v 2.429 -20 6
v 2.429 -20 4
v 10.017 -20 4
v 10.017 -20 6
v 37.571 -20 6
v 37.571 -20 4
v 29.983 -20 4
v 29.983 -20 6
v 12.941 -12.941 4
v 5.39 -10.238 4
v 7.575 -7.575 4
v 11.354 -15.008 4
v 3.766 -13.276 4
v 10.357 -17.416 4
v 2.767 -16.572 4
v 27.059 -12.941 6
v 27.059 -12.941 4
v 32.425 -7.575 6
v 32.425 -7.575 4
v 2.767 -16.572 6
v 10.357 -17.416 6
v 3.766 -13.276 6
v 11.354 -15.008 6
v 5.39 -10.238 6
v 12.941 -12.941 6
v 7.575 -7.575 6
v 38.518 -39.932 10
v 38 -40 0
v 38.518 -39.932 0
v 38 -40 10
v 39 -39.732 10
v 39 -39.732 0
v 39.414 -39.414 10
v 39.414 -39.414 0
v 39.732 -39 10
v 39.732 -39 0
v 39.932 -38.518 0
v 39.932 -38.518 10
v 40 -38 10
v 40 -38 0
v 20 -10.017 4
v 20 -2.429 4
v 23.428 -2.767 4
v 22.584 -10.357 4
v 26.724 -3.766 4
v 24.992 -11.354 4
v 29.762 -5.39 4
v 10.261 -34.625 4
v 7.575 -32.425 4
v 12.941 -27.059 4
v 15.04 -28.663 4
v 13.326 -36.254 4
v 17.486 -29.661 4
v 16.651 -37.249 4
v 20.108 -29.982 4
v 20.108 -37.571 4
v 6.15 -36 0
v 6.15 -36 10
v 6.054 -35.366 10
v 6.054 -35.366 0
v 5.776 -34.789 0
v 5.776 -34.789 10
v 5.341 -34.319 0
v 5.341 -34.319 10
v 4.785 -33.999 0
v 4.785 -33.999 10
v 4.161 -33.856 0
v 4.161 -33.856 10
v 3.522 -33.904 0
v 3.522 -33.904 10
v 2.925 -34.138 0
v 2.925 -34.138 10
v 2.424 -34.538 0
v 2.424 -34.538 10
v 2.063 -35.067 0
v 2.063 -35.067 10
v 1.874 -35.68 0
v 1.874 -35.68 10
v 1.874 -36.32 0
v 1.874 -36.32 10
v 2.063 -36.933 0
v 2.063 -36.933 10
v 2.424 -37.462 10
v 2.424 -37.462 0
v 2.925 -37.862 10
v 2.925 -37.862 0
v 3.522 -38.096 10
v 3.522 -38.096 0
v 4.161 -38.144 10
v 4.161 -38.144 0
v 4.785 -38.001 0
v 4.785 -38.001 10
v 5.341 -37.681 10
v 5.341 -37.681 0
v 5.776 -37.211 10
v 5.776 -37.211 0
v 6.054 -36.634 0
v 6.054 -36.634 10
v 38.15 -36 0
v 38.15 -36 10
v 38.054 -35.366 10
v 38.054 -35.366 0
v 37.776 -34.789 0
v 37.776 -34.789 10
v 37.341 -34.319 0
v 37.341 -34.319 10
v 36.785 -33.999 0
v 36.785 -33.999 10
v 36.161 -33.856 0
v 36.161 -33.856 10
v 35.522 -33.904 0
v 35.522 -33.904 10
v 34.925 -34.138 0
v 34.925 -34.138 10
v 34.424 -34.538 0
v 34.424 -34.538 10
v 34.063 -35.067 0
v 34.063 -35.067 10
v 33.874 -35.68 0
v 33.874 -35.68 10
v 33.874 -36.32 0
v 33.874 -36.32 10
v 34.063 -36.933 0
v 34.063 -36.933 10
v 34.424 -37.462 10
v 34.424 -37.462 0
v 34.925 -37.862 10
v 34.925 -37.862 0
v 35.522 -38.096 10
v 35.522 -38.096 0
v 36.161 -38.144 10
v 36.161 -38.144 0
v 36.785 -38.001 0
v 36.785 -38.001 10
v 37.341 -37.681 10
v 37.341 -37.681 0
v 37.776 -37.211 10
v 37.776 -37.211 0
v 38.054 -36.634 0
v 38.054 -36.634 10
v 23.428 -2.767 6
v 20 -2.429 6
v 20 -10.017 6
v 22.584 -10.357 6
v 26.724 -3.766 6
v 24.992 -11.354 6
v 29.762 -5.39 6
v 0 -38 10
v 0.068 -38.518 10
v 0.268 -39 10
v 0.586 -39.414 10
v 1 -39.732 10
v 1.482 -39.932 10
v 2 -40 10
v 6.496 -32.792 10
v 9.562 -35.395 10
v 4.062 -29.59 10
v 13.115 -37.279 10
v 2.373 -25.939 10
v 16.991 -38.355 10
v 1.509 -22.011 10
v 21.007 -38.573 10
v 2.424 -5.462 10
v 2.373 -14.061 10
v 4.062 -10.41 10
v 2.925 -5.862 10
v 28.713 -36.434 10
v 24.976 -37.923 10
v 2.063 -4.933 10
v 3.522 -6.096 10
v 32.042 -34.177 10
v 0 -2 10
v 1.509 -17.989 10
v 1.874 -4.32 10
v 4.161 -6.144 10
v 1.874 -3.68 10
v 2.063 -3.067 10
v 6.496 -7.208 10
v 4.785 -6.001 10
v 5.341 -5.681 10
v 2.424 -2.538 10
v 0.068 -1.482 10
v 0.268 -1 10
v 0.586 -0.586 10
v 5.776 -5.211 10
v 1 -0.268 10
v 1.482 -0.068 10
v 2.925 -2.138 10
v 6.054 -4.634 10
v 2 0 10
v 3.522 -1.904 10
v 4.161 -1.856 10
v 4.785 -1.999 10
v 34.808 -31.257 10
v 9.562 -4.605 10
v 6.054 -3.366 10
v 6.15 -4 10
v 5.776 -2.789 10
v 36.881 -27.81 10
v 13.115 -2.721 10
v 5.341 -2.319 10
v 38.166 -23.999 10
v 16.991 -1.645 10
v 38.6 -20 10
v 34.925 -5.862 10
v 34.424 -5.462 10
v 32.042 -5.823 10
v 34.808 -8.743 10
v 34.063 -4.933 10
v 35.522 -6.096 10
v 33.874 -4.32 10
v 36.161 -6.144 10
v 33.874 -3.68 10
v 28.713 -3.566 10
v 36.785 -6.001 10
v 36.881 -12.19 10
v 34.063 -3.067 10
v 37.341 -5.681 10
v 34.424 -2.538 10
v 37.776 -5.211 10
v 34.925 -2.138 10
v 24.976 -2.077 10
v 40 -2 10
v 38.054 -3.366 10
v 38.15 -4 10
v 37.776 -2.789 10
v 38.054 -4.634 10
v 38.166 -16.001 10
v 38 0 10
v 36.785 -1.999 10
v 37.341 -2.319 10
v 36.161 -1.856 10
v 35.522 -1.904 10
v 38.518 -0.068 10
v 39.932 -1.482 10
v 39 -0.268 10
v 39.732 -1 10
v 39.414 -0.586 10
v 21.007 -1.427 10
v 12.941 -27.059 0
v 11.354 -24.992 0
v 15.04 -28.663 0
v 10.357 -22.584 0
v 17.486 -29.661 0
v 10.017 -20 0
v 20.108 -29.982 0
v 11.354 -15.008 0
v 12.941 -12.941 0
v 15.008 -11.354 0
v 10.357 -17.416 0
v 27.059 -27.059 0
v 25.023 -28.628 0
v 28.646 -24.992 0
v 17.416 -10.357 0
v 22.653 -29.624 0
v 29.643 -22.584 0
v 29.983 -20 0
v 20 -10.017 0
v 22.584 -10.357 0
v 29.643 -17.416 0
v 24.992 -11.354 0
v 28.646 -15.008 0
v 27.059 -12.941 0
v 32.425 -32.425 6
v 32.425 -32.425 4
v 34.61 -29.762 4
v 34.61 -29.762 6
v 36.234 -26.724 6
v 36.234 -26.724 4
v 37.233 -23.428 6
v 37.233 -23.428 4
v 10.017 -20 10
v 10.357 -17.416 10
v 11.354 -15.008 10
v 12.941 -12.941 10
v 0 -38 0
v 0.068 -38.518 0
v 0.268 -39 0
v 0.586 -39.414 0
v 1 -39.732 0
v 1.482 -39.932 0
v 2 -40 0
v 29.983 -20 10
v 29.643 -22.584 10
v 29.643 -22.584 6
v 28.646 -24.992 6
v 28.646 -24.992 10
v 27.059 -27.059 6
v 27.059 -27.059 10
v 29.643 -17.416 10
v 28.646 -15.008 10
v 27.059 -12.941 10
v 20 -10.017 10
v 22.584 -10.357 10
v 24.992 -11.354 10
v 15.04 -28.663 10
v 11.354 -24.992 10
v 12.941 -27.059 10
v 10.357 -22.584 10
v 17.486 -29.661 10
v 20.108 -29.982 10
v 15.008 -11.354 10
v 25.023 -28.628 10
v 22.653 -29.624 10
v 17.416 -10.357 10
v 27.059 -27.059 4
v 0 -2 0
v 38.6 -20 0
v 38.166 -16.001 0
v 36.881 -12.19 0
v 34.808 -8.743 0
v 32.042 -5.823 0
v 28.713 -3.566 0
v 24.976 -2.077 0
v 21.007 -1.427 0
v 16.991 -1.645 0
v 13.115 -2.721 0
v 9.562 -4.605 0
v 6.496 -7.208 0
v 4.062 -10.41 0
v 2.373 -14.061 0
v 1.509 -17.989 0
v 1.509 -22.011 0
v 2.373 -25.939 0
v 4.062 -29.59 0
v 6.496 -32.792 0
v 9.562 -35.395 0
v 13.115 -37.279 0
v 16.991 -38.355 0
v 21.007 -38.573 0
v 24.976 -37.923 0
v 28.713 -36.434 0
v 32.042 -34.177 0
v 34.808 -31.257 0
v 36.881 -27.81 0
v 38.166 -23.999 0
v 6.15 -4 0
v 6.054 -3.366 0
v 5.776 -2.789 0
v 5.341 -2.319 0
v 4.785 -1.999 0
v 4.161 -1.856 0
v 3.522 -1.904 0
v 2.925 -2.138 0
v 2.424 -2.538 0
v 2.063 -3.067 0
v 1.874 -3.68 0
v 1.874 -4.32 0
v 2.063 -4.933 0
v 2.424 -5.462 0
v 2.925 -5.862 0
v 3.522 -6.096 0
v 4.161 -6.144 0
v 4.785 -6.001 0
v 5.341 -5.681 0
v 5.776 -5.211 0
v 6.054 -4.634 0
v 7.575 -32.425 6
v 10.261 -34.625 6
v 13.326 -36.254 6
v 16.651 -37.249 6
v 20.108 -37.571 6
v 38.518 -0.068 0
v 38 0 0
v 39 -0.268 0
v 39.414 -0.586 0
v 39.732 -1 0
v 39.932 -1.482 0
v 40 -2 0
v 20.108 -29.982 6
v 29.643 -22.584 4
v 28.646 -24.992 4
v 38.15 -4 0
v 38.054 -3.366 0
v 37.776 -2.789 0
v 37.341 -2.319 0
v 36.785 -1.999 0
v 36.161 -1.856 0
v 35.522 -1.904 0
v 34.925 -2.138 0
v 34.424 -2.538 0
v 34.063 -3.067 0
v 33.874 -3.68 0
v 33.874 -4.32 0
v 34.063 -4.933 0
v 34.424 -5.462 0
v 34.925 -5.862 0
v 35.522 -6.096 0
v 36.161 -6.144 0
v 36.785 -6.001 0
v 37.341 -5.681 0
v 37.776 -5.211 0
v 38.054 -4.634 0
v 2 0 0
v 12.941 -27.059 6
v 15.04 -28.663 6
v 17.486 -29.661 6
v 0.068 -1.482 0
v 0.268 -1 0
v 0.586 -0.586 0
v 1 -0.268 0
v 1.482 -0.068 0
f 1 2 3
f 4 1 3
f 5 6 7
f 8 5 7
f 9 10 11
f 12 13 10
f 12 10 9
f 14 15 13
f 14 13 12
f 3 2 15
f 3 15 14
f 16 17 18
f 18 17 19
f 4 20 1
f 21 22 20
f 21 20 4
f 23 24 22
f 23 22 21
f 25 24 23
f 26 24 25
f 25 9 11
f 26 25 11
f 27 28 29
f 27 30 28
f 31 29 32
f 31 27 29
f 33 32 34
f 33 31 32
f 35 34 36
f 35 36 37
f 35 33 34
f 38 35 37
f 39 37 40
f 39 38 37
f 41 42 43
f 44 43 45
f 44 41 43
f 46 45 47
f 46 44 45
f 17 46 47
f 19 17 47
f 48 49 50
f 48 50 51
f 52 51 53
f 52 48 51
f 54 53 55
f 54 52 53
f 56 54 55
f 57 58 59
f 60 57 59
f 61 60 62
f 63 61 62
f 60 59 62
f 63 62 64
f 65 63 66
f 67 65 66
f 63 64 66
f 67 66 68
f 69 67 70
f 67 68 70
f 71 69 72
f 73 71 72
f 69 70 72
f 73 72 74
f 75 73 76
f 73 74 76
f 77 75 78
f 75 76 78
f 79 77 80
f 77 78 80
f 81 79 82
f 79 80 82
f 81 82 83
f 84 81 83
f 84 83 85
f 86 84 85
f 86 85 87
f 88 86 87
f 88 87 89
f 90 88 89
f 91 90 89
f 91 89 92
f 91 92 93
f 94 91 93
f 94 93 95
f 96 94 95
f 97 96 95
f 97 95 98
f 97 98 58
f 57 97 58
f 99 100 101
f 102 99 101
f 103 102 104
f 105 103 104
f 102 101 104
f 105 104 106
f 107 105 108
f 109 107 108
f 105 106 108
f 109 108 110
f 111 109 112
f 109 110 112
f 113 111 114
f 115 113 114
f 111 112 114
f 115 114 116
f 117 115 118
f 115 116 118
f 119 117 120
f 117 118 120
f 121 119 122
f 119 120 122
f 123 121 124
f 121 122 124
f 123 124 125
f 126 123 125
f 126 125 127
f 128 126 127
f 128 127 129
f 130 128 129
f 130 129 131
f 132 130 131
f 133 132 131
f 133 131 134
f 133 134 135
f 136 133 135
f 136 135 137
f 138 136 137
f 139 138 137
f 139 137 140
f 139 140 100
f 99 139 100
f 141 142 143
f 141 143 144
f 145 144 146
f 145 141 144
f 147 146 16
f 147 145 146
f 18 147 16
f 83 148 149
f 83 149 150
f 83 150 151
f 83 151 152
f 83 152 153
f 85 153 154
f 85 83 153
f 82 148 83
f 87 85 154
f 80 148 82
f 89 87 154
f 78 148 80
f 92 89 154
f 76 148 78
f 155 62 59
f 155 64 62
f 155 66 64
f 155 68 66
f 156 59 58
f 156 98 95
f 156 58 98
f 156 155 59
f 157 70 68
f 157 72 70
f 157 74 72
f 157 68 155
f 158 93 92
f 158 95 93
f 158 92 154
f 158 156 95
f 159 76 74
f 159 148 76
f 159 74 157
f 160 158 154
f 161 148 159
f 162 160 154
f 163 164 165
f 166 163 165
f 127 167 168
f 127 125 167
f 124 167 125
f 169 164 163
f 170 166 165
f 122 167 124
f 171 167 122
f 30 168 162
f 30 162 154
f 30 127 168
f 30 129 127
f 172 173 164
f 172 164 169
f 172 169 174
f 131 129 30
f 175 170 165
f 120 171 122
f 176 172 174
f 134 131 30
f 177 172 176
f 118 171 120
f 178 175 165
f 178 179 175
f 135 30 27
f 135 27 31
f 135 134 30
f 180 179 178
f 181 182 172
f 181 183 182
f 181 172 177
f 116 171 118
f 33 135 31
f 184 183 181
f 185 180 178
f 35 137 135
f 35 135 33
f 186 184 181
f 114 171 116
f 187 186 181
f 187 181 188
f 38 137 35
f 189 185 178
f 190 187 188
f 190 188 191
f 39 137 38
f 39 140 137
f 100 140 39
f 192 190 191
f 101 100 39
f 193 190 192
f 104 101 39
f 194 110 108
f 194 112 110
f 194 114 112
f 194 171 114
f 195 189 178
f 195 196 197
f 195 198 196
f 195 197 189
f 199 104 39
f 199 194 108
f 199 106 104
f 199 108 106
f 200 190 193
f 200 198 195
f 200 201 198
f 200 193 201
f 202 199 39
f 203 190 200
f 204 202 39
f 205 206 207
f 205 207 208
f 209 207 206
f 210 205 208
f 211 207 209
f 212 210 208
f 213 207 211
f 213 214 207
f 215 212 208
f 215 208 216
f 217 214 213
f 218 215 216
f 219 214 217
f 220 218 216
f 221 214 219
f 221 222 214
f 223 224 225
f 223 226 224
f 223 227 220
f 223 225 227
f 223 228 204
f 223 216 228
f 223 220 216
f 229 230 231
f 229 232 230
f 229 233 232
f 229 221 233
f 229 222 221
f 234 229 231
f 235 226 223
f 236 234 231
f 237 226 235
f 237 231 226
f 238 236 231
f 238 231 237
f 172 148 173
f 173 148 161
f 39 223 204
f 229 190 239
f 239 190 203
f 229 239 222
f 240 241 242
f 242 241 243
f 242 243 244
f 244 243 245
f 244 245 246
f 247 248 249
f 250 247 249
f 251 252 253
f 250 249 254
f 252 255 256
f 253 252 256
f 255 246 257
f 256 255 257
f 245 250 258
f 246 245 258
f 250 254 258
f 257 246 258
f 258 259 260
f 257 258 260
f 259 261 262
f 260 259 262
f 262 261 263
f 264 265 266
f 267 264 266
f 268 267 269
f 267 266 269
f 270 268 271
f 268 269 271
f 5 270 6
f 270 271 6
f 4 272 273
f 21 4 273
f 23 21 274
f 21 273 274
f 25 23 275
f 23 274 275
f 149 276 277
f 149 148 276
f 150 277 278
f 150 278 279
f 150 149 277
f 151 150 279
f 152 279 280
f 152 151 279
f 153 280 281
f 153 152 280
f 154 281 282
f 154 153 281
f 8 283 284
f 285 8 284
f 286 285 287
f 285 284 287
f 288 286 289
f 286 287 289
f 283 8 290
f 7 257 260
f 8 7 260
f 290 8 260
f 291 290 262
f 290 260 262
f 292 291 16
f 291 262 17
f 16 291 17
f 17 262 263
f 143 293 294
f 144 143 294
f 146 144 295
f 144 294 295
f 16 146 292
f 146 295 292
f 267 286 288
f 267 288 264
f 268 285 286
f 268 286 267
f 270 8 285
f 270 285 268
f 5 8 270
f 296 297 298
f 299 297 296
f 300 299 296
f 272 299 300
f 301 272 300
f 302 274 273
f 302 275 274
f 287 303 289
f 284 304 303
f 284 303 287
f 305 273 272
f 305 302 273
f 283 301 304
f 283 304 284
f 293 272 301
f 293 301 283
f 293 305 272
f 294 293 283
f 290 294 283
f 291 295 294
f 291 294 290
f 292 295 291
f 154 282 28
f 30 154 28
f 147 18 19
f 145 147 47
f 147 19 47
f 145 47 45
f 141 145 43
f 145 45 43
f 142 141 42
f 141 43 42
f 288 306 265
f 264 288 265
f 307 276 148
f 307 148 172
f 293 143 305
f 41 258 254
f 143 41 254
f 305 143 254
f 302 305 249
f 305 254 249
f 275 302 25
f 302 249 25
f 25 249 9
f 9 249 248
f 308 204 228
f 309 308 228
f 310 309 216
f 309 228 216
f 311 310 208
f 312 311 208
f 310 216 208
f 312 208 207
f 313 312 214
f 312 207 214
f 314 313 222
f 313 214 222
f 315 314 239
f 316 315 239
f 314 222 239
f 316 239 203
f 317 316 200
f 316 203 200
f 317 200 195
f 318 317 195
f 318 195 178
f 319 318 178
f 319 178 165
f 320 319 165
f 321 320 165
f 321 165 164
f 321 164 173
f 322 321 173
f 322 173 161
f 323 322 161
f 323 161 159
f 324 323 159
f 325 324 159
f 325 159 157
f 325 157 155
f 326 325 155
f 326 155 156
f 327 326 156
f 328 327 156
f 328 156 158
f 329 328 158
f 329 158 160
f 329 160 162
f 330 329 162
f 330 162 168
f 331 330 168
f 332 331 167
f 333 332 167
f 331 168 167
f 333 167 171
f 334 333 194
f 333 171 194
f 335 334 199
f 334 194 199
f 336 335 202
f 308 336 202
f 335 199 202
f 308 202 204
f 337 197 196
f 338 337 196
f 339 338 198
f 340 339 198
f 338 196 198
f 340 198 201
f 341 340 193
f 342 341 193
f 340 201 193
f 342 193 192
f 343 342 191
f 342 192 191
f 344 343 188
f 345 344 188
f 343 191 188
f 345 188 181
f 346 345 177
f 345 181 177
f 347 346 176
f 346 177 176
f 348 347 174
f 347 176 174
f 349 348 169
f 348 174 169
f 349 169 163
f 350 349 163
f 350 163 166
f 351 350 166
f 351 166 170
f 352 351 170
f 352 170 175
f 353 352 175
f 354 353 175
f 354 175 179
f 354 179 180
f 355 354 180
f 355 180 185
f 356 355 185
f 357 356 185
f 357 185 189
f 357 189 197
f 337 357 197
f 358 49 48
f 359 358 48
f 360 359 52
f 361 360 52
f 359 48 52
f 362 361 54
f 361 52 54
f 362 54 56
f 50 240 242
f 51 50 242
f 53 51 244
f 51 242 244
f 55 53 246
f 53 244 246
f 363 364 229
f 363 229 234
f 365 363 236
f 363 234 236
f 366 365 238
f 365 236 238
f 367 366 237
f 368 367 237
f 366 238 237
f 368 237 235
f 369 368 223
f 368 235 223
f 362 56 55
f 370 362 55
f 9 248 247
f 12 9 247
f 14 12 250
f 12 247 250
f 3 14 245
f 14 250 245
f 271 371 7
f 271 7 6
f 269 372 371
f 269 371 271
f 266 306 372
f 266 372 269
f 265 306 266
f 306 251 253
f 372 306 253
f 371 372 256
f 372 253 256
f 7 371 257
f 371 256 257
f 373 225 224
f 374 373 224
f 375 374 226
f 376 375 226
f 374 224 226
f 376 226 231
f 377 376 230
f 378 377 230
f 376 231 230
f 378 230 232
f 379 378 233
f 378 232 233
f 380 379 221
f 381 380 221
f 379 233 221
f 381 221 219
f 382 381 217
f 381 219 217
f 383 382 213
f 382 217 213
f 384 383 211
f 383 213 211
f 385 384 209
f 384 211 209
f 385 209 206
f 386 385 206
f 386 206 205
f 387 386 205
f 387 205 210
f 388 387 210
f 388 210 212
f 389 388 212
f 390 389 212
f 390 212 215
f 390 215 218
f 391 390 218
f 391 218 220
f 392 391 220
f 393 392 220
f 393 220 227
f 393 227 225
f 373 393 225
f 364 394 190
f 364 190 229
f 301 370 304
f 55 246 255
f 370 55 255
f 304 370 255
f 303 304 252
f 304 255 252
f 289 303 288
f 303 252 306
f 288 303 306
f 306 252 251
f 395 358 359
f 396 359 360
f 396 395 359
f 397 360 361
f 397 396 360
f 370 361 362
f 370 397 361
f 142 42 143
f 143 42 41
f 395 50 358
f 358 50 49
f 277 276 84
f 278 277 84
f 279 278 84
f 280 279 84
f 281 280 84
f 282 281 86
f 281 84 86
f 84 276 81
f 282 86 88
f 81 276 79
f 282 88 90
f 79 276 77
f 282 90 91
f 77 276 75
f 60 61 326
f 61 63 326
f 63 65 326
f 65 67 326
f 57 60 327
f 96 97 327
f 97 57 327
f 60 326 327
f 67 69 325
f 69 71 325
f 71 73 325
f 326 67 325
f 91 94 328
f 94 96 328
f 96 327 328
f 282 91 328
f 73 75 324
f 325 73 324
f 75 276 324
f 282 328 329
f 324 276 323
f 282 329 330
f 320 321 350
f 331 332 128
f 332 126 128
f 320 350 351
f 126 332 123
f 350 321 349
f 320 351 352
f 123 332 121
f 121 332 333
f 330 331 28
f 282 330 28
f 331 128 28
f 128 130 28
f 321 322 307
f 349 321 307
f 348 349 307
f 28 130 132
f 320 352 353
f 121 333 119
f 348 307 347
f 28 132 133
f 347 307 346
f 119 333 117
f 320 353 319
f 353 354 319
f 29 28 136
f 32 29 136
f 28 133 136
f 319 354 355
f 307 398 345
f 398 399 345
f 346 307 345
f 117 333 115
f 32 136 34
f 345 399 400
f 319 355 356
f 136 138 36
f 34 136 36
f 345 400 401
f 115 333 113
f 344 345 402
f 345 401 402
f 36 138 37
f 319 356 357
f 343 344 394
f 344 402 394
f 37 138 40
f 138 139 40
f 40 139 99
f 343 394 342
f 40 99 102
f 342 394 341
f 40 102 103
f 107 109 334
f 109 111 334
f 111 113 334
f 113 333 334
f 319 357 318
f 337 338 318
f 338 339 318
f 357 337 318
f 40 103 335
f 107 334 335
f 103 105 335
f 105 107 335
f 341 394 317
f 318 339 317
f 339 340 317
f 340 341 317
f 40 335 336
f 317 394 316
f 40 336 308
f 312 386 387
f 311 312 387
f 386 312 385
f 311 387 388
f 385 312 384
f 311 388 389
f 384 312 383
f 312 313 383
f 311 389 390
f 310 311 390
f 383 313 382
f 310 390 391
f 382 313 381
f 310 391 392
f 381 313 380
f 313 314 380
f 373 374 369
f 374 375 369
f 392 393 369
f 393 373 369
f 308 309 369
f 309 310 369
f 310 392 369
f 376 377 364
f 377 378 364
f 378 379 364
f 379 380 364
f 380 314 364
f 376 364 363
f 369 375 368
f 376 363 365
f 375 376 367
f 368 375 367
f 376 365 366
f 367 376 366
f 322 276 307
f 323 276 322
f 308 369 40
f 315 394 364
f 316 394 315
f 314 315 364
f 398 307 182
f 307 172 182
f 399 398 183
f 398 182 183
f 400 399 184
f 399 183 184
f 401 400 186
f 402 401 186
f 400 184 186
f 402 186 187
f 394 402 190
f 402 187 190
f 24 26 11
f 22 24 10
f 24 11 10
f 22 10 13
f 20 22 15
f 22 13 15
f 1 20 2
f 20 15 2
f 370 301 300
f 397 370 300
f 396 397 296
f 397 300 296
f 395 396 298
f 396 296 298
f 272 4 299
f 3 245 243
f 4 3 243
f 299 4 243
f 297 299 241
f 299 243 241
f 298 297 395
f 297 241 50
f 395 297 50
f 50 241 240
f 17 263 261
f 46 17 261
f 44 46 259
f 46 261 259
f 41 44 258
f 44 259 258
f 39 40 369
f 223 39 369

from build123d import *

# Parameters (mm, degrees)
F0_W      = 40
F0_H      = 40
F1_DEPTH  = 10
F2_R      = 18.6004987273
F3_DEPTH  = 25
F5_DEPTH  = 10
F6_R      = 2.15
F7_DEPTH  = 25
F8_R      = 2
F10_DEPTH = 4
F12_DEPTH = 4


with BuildPart() as f1:
    # F0 (on Top) → F1 (new body)
    with BuildSketch(Plane.XY):
        with Locations((20, -20)):
            Rectangle(F0_W, F0_H)
    extrude(amount=F1_DEPTH)

    # F2 (on face) → F3 (cut)
    with BuildSketch(Plane.XY.offset(10)):
        with Locations((20, -20)):
            Circle(F2_R)
    extrude(amount=-F3_DEPTH, mode=Mode.SUBTRACT)

    # F6 (on face) → F7 (cut)
    with BuildSketch(Plane.XY.offset(10)):
        with Locations((4, -4)):
            Circle(F6_R)
        with Locations((4, -36)):
            Circle(F6_R)
        with Locations((36, -4)):
            Circle(F6_R)
        with Locations((36, -36)):
            Circle(F6_R)
    extrude(amount=-F7_DEPTH, mode=Mode.SUBTRACT)

    # F8
    f8_edges = [f1.edges().sort_by_distance(p)[0] for p in [
        (0, 0, 5),
        (40, 0, 5),
        (40, -40, 5),
        (0, -40, 5),
    ]]
    fillet(f8_edges, radius=F8_R)


with BuildPart() as f5:
    # F4 (on Top) → F5 (new body, through all)
    with BuildSketch(Plane.XY):
        with BuildLine():
            ThreePointArc((27.0590603092, -27.0590603092), (29.2231067668, -23.82033591), (29.9830188268, -20))
            ThreePointArc((29.9830188268, -20), (29.2231067668, -16.17966409), (27.0590603092, -12.9409396908))
            Line((27.0590603092, -12.9409396908), (20, -20))
            Line((20, -20), (27.0590603092, -27.0590603092))
        make_face()
        with BuildLine():
            Line((37.5710188268, -20), (29.9830188268, -20))
            ThreePointArc((29.9830188268, -20), (29.2231067668, -23.82033591), (27.0590603092, -27.0590603092))
            Line((27.0590603092, -27.0590603092), (32.4245865648, -32.4245865648))
            ThreePointArc((32.4245865648, -32.4245865648), (36.2335046595, -26.7241377948), (37.5710188268, -20))
        make_face()
        with BuildLine():
            Line((20, -20), (27.0590603092, -12.9409396908))
            ThreePointArc((27.0590603092, -12.9409396908), (23.82033591, -10.7768932332), (20, -10.0169811732))
            ThreePointArc((20, -10.0169811732), (16.17966409, -10.7768932332), (12.9409396908, -12.9409396908))
            Line((12.9409396908, -12.9409396908), (20, -20))
        make_face()
        with BuildLine():
            ThreePointArc((20, -10.0169811732), (23.82033591, -10.7768932332), (27.0590603092, -12.9409396908))
            Line((27.0590603092, -12.9409396908), (32.4245865648, -7.5754134352))
            ThreePointArc((32.4245865648, -7.5754134352), (26.7241377948, -3.7664953405), (20, -2.4289811732))
            Line((20, -2.4289811732), (20, -10.0169811732))
        make_face()
        with BuildLine():
            ThreePointArc((20.1078887367, -29.9824358208), (23.8701189584, -29.2023281915), (27.0590603092, -27.0590603092))
            Line((27.0590603092, -27.0590603092), (20, -20))
            Line((20, -20), (12.9409396908, -27.0590603092))
            ThreePointArc((12.9409396908, -27.0590603092), (16.2295586925, -29.2436160264), (20.1078887367, -29.9824358208))
        make_face()
        with BuildLine():
            Line((12.9409396908, -27.0590603092), (20, -20))
            Line((20, -20), (12.9409396908, -12.9409396908))
            ThreePointArc((12.9409396908, -12.9409396908), (10.7768932332, -16.17966409), (10.0169811732, -20))
            ThreePointArc((10.0169811732, -20), (10.7768932332, -23.82033591), (12.9409396908, -27.0590603092))
        make_face()
        with BuildLine():
            Line((20.1078887367, -37.5706875971), (20.1078887367, -29.9824358208))
            ThreePointArc((20.1078887367, -29.9824358208), (16.2295586925, -29.2436160264), (12.9409396908, -27.0590603092))
            Line((12.9409396908, -27.0590603092), (7.5754134352, -32.4245865648))
            ThreePointArc((7.5754134352, -32.4245865648), (13.325732227, -36.2540718685), (20.1078887367, -37.5706875971))
        make_face()
        with BuildLine():
            ThreePointArc((10.0169811732, -20), (10.7768932332, -16.17966409), (12.9409396908, -12.9409396908))
            Line((12.9409396908, -12.9409396908), (7.5754134352, -7.5754134352))
            ThreePointArc((7.5754134352, -7.5754134352), (3.7664953405, -13.2758622052), (2.4289811732, -20))
            Line((2.4289811732, -20), (10.0169811732, -20))
        make_face()
    extrude(amount=F5_DEPTH)

    # F9 (on face) → F10 (cut)
    with BuildSketch(Plane.XY.offset(10)):
        with BuildLine():
            Line((37.5710188268, -20), (29.9830188268, -20))
            ThreePointArc((29.9830188268, -20), (29.2231067668, -23.82033591), (27.0590603092, -27.0590603092))
            Line((27.0590603092, -27.0590603092), (32.4245865648, -32.4245865648))
            ThreePointArc((32.4245865648, -32.4245865648), (36.2335046595, -26.7241377948), (37.5710188268, -20))
        make_face()
        with BuildLine():
            ThreePointArc((20.1078887367, -29.9824358208), (16.2295586925, -29.2436160264), (12.9409396908, -27.0590603092))
            Line((12.9409396908, -27.0590603092), (7.5754134352, -32.4245865648))
            ThreePointArc((7.5754134352, -32.4245865648), (13.325732227, -36.2540718685), (20.1078887367, -37.5706875971))
            Line((20.1078887367, -37.5706875971), (20.1078887367, -29.9824358208))
        make_face()
        with BuildLine():
            ThreePointArc((10.0169811732, -20), (10.7768932332, -16.17966409), (12.9409396908, -12.9409396908))
            Line((12.9409396908, -12.9409396908), (7.5754134352, -7.5754134352))
            ThreePointArc((7.5754134352, -7.5754134352), (3.7664953405, -13.2758622052), (2.4289811732, -20))
            Line((2.4289811732, -20), (10.0169811732, -20))
        make_face()
        with BuildLine():
            ThreePointArc((32.4245865648, -7.5754134352), (26.7241377948, -3.7664953405), (20, -2.4289811732))
            Line((20, -2.4289811732), (20, -10.0169811732))
            ThreePointArc((20, -10.0169811732), (23.82033591, -10.7768932332), (27.0590603092, -12.9409396908))
            Line((27.0590603092, -12.9409396908), (32.4245865648, -7.5754134352))
        make_face()
    extrude(amount=-F10_DEPTH, mode=Mode.SUBTRACT)

    # F11 (on face) → F12 (cut)
    with BuildSketch(Plane(origin=(0, 0, 0), x_dir=(1, 0, 0), z_dir=(0, 0, -1))):
        with BuildLine():
            Line((7.5754134352, 7.5754134352), (12.9409396908, 12.9409396908))
            ThreePointArc((12.9409396908, 12.9409396908), (10.7768932332, 16.17966409), (10.0169811732, 20))
            Line((10.0169811732, 20), (2.4289811732, 20))
            ThreePointArc((2.4289811732, 20), (3.7664953405, 13.2758622052), (7.5754134352, 7.5754134352))
        make_face()
        with BuildLine():
            Line((7.5754134352, 32.4245865648), (12.9409396908, 27.0590603092))
            ThreePointArc((12.9409396908, 27.0590603092), (16.2295586925, 29.2436160264), (20.1078887367, 29.9824358208))
            Line((20.1078887367, 29.9824358208), (20.1078887367, 37.5706875971))
            ThreePointArc((20.1078887367, 37.5706875971), (13.325732227, 36.2540718685), (7.5754134352, 32.4245865648))
        make_face()
        with BuildLine():
            ThreePointArc((27.0590603092, 27.0590603092), (29.2231067668, 23.82033591), (29.9830188268, 20))
            Line((29.9830188268, 20), (37.5710188268, 20))
            ThreePointArc((37.5710188268, 20), (36.2335046595, 26.7241377948), (32.4245865648, 32.4245865648))
            Line((32.4245865648, 32.4245865648), (27.0590603092, 27.0590603092))
        make_face()
        with BuildLine():
            ThreePointArc((27.0590603092, 12.9409396908), (23.82033591, 10.7768932332), (20, 10.0169811732))
            Line((20, 10.0169811732), (20, 2.4289811732))
            ThreePointArc((20, 2.4289811732), (26.7241377948, 3.7664953405), (32.4245865648, 7.5754134352))
            Line((32.4245865648, 7.5754134352), (27.0590603092, 12.9409396908))
        make_face()
    extrude(amount=-F12_DEPTH, mode=Mode.SUBTRACT)


solid = Compound([f1.part, f5.part])
